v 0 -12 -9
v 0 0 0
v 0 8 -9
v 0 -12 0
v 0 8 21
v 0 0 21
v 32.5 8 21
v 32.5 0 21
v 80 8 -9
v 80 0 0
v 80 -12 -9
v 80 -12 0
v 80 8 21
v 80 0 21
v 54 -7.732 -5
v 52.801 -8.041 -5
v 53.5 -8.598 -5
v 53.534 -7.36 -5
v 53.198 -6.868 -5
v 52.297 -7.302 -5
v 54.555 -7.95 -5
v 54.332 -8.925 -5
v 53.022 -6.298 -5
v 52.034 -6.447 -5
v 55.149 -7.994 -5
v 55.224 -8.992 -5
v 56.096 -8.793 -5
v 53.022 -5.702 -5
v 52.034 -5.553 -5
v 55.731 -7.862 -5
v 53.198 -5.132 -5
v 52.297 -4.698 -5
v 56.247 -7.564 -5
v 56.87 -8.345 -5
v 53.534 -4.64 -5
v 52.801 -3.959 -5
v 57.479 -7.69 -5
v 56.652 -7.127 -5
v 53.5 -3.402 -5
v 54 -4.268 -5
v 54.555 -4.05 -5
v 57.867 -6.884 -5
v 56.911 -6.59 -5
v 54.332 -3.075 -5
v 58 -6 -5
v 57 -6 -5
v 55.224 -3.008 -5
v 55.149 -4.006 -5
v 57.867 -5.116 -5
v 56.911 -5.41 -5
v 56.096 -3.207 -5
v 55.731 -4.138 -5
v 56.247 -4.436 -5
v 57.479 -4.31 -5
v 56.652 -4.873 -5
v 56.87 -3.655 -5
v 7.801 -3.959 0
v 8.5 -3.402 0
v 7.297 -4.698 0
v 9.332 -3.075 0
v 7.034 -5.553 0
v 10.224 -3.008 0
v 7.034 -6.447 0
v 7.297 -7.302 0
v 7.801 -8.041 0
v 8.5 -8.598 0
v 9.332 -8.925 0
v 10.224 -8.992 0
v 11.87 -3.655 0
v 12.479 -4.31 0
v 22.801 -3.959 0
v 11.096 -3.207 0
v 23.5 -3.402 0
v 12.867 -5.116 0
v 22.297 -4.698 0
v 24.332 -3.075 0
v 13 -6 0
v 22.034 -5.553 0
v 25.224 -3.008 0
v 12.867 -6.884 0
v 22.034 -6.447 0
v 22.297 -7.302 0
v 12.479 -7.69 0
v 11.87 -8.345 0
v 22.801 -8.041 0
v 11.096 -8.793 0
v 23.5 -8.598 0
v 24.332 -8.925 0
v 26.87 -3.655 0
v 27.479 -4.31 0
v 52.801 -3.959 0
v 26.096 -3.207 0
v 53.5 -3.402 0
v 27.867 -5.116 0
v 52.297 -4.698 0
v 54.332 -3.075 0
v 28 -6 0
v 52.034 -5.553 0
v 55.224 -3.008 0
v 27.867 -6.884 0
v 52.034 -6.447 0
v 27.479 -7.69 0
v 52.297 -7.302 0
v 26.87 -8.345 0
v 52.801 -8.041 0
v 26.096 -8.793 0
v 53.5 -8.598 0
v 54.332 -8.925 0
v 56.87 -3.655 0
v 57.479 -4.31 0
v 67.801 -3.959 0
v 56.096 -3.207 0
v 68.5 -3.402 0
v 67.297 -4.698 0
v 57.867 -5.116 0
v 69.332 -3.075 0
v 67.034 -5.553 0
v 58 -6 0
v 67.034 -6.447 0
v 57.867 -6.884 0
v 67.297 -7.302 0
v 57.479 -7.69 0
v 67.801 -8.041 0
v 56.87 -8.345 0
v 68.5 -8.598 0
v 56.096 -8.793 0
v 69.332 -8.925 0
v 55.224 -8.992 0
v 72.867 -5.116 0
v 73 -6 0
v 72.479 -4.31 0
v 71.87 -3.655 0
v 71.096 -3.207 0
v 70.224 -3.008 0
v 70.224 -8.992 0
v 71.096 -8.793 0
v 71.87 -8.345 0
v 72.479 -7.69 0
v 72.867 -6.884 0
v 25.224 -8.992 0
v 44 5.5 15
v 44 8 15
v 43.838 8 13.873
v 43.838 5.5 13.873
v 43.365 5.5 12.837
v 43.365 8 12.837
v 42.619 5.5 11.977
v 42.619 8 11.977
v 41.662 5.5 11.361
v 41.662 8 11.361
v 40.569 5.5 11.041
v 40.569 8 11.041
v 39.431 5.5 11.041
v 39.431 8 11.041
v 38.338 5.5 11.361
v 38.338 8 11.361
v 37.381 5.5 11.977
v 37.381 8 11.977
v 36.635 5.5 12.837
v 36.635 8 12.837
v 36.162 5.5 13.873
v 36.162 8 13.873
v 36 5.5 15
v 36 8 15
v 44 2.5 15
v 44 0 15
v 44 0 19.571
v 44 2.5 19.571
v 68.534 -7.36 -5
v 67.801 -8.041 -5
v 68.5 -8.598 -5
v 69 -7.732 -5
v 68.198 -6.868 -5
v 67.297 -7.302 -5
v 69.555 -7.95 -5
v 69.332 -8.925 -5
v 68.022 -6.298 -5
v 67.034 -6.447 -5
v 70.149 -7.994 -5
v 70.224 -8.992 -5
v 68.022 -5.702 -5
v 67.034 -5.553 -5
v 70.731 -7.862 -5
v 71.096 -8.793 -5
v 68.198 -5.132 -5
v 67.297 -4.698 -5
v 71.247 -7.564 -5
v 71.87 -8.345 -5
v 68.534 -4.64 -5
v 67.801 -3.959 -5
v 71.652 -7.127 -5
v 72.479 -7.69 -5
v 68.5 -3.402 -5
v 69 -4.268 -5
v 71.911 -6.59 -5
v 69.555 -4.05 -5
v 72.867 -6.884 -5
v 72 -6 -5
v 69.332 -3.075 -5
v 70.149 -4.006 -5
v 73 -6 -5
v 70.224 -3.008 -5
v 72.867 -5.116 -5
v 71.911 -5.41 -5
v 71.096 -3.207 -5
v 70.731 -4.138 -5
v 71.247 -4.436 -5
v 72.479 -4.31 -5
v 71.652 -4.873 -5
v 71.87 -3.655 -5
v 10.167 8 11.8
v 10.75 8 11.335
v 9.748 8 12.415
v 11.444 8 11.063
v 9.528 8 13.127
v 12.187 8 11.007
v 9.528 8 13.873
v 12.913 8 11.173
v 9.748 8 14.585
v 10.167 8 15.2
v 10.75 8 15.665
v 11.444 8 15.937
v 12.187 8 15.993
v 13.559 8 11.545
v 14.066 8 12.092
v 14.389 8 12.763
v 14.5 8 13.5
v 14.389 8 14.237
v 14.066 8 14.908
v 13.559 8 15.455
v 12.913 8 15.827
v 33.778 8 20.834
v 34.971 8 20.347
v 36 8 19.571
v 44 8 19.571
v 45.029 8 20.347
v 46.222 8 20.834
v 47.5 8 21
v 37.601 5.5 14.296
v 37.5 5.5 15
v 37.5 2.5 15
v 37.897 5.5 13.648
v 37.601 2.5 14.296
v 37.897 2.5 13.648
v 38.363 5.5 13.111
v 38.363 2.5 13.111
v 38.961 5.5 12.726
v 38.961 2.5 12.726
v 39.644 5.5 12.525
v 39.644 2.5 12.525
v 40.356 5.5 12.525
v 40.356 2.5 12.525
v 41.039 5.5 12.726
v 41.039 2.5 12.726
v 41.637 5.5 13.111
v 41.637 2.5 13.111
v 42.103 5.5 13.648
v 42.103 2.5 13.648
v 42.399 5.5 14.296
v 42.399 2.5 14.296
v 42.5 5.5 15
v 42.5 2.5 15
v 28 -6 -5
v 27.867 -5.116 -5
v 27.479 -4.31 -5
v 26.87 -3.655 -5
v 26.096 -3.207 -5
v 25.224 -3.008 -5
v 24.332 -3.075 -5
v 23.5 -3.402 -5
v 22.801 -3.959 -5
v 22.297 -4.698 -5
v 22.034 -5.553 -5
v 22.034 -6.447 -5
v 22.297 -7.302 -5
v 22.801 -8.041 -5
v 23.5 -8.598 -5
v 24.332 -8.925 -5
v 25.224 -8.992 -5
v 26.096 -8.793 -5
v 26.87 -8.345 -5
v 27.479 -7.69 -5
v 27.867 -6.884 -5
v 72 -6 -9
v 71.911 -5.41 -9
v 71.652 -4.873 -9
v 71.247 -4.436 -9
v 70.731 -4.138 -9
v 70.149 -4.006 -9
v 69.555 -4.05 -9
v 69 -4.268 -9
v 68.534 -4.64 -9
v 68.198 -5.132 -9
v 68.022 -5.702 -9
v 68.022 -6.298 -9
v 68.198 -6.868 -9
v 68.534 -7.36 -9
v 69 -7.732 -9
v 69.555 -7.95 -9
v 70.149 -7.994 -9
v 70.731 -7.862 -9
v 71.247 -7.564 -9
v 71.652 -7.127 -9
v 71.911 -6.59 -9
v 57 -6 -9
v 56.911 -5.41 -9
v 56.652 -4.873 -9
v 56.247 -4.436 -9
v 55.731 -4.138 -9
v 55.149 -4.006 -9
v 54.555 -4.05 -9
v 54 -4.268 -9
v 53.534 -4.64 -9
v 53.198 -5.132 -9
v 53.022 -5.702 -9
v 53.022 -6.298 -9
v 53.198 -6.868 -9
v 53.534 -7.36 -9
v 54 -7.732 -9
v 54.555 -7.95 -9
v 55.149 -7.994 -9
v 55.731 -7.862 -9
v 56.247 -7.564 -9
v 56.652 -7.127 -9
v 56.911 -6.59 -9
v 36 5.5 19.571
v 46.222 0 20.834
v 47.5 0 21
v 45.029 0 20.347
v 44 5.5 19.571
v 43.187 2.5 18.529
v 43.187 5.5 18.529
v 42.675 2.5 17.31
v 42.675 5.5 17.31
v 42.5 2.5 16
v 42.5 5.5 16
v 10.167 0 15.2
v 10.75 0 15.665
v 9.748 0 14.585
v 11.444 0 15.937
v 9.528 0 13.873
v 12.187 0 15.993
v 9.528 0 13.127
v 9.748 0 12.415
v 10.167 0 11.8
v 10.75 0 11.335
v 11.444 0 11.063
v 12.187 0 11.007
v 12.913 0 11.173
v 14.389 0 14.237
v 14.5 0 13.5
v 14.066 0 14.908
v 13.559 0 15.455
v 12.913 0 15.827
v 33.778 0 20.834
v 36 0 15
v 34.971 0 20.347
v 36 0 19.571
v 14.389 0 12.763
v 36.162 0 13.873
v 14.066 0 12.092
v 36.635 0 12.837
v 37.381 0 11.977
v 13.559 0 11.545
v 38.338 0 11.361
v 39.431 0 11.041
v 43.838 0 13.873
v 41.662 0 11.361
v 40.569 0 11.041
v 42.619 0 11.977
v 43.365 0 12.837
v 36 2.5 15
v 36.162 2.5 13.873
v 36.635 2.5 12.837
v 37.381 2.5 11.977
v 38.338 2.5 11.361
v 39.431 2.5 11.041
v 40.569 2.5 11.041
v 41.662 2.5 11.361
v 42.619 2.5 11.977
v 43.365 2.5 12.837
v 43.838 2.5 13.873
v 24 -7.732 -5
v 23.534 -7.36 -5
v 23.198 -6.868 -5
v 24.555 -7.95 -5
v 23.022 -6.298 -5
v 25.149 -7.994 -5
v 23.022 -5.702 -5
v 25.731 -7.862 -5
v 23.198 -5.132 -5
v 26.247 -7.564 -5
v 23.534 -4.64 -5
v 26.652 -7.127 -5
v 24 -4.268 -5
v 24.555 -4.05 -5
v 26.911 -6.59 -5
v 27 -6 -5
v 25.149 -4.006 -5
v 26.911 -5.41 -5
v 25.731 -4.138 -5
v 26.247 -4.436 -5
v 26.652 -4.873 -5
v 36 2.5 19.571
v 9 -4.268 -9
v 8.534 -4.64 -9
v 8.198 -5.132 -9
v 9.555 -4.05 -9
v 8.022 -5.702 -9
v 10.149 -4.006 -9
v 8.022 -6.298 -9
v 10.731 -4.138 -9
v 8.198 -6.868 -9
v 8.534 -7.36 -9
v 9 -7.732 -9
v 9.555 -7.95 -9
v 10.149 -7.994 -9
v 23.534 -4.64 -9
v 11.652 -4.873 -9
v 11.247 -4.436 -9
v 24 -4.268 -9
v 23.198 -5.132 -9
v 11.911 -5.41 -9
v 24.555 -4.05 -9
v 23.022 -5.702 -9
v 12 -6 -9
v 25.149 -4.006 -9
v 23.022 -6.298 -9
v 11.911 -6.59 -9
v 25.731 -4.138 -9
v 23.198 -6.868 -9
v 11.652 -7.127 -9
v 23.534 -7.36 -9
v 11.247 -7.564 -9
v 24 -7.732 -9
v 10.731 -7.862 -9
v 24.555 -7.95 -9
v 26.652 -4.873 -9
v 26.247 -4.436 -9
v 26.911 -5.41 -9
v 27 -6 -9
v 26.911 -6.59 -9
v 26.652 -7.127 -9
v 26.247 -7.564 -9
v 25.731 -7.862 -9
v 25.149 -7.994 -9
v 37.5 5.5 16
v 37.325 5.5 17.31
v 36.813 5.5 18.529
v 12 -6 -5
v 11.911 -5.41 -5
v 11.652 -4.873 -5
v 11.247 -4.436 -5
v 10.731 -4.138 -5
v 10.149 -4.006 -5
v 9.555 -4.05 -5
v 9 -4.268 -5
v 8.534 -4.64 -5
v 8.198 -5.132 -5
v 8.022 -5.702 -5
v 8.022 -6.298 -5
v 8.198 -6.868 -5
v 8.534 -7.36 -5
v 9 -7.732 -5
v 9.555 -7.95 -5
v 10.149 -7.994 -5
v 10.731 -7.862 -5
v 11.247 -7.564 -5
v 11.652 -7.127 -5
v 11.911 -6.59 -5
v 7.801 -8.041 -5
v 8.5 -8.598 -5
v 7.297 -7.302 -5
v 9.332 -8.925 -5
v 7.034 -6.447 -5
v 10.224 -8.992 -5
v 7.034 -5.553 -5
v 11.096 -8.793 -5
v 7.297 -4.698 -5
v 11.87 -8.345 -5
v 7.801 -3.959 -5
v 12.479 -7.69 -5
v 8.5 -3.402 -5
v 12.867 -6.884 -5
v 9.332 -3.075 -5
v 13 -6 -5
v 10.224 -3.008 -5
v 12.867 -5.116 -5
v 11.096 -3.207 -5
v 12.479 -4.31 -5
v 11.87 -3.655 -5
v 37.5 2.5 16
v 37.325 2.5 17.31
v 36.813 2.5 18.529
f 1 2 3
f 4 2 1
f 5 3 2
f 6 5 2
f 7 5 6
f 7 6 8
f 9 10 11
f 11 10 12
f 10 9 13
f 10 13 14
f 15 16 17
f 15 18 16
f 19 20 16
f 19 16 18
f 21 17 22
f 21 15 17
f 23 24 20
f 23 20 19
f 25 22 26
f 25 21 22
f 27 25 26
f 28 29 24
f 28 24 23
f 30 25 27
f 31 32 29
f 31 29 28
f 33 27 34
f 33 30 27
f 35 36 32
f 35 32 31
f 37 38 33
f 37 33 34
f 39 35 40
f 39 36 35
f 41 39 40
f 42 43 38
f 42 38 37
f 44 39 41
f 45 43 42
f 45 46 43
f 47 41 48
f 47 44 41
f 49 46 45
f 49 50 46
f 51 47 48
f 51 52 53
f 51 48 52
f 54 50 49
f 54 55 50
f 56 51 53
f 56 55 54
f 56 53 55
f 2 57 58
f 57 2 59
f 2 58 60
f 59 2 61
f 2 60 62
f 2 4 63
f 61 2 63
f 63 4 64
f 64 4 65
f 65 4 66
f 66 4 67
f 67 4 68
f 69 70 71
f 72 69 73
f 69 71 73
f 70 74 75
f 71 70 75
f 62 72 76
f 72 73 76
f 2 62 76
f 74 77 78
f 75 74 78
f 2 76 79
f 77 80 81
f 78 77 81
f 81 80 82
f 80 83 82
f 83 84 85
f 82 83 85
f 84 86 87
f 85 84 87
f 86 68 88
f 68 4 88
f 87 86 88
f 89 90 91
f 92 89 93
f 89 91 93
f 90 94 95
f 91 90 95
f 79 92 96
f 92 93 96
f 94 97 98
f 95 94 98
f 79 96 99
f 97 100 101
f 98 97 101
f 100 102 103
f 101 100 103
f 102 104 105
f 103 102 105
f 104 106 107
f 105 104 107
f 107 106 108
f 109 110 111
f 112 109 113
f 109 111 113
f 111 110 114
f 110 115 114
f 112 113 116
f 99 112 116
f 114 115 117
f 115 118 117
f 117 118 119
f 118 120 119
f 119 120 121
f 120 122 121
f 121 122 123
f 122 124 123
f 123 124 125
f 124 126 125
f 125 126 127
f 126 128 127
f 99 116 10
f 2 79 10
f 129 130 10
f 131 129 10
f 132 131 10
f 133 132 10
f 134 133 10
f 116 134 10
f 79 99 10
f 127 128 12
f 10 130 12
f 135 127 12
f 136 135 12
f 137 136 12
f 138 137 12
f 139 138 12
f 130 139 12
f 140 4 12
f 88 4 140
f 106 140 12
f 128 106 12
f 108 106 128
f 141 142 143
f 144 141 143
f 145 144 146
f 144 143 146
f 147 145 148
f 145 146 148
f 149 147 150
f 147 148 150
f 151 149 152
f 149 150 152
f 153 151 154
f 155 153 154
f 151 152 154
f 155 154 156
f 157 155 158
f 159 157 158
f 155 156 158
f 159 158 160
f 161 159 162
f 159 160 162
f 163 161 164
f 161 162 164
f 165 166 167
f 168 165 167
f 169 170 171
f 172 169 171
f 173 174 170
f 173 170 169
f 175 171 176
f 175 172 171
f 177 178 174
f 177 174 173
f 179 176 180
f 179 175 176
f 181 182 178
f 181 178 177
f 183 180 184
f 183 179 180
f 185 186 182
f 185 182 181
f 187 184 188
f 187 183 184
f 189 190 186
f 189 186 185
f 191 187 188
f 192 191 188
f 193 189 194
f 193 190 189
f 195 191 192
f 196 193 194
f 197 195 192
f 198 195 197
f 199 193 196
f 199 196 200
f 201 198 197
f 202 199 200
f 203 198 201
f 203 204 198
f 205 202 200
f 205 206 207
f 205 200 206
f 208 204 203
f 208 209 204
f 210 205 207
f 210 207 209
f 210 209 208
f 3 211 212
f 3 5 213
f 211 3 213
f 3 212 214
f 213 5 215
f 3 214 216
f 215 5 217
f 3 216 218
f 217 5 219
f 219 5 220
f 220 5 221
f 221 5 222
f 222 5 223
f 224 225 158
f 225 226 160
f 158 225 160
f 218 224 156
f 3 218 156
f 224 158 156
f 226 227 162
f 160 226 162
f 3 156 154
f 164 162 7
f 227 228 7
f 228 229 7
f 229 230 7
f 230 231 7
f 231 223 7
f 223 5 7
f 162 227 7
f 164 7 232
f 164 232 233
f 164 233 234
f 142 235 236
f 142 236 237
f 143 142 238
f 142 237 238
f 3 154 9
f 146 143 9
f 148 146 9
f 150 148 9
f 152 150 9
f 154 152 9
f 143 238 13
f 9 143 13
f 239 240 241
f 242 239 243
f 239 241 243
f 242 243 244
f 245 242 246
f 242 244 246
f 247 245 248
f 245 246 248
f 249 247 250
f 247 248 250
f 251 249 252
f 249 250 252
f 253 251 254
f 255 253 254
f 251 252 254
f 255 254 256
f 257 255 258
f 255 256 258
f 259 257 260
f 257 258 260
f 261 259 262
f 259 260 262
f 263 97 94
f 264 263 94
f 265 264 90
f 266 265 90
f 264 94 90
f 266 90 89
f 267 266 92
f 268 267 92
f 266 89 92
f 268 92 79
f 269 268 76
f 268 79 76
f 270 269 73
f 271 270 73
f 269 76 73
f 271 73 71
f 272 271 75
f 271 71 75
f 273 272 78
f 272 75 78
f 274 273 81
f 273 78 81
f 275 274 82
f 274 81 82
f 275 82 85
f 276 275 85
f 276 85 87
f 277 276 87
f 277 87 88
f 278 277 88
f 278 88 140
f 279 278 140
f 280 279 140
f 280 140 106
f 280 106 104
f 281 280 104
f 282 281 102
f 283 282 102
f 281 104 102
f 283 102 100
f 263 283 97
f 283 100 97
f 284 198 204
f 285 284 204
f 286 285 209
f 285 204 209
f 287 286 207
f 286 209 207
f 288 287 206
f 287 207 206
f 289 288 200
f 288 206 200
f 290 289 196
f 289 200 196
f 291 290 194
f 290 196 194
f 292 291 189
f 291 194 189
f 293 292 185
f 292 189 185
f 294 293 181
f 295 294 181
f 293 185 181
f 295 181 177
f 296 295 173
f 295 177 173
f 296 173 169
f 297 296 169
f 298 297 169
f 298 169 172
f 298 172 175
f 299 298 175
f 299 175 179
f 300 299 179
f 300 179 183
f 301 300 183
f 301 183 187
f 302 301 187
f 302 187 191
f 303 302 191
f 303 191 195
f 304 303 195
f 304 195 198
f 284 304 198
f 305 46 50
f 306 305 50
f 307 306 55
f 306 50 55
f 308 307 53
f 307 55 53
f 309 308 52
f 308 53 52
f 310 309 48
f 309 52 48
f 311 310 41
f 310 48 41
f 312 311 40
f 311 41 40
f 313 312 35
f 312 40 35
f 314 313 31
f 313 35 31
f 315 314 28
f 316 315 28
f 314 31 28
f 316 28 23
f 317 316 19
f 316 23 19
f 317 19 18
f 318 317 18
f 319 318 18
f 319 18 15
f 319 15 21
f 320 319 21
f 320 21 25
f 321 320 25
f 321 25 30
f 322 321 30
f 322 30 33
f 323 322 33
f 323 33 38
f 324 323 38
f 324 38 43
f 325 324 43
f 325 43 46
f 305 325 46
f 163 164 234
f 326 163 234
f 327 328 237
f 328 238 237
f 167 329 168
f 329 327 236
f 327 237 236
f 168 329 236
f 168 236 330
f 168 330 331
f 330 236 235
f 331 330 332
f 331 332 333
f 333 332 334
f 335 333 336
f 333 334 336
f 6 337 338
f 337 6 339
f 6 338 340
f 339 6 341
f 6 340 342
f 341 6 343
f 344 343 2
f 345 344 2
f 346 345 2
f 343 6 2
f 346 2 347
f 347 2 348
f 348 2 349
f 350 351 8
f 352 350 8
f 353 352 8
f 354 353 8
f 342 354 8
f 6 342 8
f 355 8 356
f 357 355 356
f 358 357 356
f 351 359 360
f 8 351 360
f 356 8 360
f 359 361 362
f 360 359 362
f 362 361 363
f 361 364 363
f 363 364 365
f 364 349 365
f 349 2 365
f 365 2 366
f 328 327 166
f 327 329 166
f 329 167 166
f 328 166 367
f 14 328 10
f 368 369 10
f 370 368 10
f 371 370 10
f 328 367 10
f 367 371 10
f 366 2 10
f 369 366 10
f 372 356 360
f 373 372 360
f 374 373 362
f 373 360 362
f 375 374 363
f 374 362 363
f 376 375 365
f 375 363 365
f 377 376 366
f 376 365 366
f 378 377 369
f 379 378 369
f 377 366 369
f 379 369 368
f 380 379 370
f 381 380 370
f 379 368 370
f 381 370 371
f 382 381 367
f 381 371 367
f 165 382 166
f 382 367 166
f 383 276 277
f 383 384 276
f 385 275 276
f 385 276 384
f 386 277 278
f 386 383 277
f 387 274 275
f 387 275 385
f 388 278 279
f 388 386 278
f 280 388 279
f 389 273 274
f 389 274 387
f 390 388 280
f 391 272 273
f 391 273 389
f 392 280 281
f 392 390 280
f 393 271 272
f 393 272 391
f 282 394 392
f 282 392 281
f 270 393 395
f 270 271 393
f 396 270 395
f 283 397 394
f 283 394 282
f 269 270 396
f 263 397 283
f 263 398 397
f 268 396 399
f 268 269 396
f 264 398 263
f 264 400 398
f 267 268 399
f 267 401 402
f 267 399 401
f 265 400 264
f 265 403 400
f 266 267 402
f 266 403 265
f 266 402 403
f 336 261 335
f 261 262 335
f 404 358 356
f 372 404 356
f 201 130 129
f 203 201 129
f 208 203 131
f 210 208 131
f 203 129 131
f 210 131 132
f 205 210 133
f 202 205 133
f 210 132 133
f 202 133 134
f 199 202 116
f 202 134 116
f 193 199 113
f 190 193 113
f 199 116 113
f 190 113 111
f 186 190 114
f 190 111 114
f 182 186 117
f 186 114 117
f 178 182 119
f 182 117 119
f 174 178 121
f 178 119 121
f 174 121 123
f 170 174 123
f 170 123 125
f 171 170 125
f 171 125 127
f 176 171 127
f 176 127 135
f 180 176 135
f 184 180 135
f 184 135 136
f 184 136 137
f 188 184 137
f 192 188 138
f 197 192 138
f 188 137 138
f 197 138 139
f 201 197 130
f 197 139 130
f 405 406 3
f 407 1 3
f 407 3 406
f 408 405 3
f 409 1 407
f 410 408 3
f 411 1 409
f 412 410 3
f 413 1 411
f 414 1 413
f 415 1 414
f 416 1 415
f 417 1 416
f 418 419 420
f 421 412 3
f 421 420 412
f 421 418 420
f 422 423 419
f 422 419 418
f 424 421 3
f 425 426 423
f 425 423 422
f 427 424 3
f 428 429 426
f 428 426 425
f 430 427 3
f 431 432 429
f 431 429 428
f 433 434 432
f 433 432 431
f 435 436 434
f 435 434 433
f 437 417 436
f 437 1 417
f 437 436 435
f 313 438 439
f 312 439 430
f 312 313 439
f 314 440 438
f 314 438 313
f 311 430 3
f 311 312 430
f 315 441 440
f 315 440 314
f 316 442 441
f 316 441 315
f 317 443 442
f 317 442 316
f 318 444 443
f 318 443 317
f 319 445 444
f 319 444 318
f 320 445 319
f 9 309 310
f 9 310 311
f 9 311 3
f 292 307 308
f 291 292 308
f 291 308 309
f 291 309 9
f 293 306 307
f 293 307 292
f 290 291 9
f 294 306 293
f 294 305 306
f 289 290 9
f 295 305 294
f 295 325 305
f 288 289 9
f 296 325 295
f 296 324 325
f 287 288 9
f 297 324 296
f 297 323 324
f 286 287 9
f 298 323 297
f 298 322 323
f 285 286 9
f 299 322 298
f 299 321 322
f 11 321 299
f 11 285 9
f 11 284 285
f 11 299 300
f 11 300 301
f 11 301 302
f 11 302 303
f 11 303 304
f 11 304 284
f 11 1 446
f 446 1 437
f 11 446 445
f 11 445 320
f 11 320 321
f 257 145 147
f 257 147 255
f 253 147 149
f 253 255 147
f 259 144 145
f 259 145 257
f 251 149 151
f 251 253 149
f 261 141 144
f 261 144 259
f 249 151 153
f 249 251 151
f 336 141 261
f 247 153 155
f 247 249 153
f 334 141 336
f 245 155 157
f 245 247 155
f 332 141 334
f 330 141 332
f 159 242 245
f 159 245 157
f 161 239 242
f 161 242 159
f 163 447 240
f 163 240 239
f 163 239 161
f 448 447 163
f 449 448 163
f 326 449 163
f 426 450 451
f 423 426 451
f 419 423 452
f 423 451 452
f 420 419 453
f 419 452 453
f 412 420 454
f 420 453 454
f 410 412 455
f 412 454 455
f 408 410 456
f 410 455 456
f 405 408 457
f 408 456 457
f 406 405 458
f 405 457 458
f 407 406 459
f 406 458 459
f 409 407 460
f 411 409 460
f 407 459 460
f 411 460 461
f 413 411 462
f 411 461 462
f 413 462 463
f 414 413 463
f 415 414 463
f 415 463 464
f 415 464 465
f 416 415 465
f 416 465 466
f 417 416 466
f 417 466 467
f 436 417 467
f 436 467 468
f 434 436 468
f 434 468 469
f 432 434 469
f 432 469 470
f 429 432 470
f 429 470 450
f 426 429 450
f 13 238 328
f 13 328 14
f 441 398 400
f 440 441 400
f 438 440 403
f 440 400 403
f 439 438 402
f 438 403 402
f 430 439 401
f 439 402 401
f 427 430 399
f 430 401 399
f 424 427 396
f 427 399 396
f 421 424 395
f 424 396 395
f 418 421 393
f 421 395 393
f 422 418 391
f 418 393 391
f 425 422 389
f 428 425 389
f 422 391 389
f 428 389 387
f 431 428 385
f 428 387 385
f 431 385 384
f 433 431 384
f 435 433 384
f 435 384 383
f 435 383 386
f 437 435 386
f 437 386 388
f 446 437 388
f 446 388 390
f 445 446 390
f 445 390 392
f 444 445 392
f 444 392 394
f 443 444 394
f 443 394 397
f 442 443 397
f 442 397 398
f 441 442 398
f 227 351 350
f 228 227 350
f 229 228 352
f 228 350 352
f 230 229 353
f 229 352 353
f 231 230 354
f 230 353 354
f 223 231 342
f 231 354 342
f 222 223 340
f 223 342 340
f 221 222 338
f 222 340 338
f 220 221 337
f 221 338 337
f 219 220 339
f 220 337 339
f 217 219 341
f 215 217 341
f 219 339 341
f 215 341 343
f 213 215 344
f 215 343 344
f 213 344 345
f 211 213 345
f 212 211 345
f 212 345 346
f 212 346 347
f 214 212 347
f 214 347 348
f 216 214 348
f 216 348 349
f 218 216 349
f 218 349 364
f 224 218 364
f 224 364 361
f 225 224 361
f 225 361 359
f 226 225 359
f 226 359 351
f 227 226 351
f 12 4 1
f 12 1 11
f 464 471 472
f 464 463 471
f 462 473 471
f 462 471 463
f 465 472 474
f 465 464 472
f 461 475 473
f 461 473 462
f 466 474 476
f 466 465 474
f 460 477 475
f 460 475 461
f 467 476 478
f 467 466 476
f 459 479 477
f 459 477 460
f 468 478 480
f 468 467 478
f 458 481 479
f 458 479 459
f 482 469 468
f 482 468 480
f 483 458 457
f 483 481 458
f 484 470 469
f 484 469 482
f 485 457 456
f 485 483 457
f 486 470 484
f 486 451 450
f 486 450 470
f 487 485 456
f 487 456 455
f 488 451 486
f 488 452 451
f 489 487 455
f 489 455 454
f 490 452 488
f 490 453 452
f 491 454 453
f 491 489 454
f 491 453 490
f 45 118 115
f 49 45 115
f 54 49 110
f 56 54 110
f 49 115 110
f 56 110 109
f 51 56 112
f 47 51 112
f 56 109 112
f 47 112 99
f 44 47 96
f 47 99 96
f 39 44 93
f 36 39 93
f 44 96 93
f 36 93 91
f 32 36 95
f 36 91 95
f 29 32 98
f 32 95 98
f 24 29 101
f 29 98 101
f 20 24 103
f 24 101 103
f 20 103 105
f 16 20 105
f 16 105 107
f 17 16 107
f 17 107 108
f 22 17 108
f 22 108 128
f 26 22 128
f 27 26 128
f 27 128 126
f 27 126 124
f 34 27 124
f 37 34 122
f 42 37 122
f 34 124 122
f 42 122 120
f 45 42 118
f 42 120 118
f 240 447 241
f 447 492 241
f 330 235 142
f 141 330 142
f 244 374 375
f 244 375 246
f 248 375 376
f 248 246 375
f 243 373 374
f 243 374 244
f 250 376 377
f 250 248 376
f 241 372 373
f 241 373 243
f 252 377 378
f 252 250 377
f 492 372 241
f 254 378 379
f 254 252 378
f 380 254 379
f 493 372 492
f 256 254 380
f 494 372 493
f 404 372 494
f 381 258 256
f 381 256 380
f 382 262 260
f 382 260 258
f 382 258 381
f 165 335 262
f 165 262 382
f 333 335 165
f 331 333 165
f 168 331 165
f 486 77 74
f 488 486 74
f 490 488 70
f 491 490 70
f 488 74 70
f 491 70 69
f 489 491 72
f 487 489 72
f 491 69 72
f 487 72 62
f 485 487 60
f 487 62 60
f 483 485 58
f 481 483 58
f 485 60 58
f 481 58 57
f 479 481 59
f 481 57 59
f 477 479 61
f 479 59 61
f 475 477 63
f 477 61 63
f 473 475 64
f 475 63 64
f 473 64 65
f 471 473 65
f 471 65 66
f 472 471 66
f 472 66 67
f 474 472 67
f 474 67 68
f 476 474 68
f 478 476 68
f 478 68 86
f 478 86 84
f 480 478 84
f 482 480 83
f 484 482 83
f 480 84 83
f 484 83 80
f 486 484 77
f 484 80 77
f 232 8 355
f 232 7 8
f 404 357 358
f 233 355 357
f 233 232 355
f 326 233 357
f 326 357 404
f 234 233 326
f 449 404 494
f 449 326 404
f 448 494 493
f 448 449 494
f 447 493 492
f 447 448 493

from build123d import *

# Parameters (mm, degrees)
F0_W      = 80
F0_H      = 8
F1_DEPTH  = 21
F3_DEPTH  = 25
F5_DEPTH  = 2.5
F7_DEPTH  = 2.5
F8_R      = 5
F9_W      = 80
F9_H      = 20
F10_DEPTH = 9
F11_R     = 2
F12_DEPTH = 25
F13_R     = 3
F14_DEPTH = 5
F15_R     = 2.5
F16_DEPTH = 25


with BuildPart() as f1:
    # F0 (on Top) → F1 (new body)
    with BuildSketch(Plane.XY):
        with Locations((40, 4)):
            Rectangle(F0_W, F0_H)
    extrude(amount=F1_DEPTH)

    # F2 (on face) → F3 (cut)
    with BuildSketch(Plane.XZ):
        with BuildLine():
            Line((37.5, 21), (37.5, 15))
            ThreePointArc((37.5, 15), (40, 12.5), (42.5, 15))
            Line((42.5, 15), (42.5, 21))
            Line((42.5, 21), (37.5, 21))
        make_face()
    extrude(amount=-F3_DEPTH, mode=Mode.SUBTRACT)

    # F4 (on face) → F5 (cut)
    with BuildSketch(Plane.XZ):
        with BuildLine():
            Line((36, 21), (36, 15))
            ThreePointArc((36, 15), (40, 11), (44, 15))
            Line((44, 15), (44, 21))
            Line((44, 21), (42.5, 21))
            Line((42.5, 21), (42.5, 15))
            ThreePointArc((42.5, 15), (40, 12.5), (37.5, 15))
            Line((37.5, 15), (37.5, 21))
            Line((37.5, 21), (36, 21))
        make_face()
    extrude(amount=-F5_DEPTH, mode=Mode.SUBTRACT)

    # F6 (on face) → F7 (cut)
    with BuildSketch(Plane(origin=(0, 8, 0), x_dir=(-1, 0, 0), z_dir=(0, 1, 0))):
        with BuildLine():
            Line((-44, 21), (-44, 15))
            ThreePointArc((-44, 15), (-40, 11), (-36, 15))
            Line((-36, 15), (-36, 21))
            Line((-36, 21), (-37.5, 21))
            Line((-37.5, 21), (-37.5, 15))
            ThreePointArc((-37.5, 15), (-40, 12.5), (-42.5, 15))
            Line((-42.5, 15), (-42.5, 21))
            Line((-42.5, 21), (-44, 21))
        make_face()
    extrude(amount=-F7_DEPTH, mode=Mode.SUBTRACT)

    # F8
    f8_edges = [f1.edges().sort_by_distance(p)[0] for p in [
        (42.5, 4, 21),
        (37.5, 4, 21),
    ]]
    fillet(f8_edges, radius=F8_R)

    # F9 (on face) → F10 (join)
    with BuildSketch(Plane(origin=(0, 0, 0), x_dir=(1, 0, 0), z_dir=(0, 0, -1))):
        with Locations((40, 2)):
            Rectangle(F9_W, F9_H)
    extrude(amount=F10_DEPTH)

    # F11 (on face) → F12 (cut)
    with BuildSketch(Plane.XY):
        with Locations((10, -6)):
            Circle(F11_R)
        with Locations((25, -6)):
            Circle(F11_R)
        with Locations((70, -6)):
            Circle(F11_R)
        with Locations((55, -6)):
            Circle(F11_R)
    extrude(amount=-F12_DEPTH, mode=Mode.SUBTRACT)

    # F13 (on face) → F14 (cut)
    with BuildSketch(Plane.XY):
        with Locations((10, -6)):
            Circle(F13_R)
        with Locations((25, -6)):
            Circle(F13_R)
        with Locations((55, -6)):
            Circle(F13_R)
        with Locations((70, -6)):
            Circle(F13_R)
    extrude(amount=-F14_DEPTH, mode=Mode.SUBTRACT)

    # F15 (on face) → F16 (cut)
    with BuildSketch(Plane.XZ):
        with Locations((12, 13.5)):
            Circle(F15_R)
    extrude(amount=-F16_DEPTH, mode=Mode.SUBTRACT)


solid = f1.part
